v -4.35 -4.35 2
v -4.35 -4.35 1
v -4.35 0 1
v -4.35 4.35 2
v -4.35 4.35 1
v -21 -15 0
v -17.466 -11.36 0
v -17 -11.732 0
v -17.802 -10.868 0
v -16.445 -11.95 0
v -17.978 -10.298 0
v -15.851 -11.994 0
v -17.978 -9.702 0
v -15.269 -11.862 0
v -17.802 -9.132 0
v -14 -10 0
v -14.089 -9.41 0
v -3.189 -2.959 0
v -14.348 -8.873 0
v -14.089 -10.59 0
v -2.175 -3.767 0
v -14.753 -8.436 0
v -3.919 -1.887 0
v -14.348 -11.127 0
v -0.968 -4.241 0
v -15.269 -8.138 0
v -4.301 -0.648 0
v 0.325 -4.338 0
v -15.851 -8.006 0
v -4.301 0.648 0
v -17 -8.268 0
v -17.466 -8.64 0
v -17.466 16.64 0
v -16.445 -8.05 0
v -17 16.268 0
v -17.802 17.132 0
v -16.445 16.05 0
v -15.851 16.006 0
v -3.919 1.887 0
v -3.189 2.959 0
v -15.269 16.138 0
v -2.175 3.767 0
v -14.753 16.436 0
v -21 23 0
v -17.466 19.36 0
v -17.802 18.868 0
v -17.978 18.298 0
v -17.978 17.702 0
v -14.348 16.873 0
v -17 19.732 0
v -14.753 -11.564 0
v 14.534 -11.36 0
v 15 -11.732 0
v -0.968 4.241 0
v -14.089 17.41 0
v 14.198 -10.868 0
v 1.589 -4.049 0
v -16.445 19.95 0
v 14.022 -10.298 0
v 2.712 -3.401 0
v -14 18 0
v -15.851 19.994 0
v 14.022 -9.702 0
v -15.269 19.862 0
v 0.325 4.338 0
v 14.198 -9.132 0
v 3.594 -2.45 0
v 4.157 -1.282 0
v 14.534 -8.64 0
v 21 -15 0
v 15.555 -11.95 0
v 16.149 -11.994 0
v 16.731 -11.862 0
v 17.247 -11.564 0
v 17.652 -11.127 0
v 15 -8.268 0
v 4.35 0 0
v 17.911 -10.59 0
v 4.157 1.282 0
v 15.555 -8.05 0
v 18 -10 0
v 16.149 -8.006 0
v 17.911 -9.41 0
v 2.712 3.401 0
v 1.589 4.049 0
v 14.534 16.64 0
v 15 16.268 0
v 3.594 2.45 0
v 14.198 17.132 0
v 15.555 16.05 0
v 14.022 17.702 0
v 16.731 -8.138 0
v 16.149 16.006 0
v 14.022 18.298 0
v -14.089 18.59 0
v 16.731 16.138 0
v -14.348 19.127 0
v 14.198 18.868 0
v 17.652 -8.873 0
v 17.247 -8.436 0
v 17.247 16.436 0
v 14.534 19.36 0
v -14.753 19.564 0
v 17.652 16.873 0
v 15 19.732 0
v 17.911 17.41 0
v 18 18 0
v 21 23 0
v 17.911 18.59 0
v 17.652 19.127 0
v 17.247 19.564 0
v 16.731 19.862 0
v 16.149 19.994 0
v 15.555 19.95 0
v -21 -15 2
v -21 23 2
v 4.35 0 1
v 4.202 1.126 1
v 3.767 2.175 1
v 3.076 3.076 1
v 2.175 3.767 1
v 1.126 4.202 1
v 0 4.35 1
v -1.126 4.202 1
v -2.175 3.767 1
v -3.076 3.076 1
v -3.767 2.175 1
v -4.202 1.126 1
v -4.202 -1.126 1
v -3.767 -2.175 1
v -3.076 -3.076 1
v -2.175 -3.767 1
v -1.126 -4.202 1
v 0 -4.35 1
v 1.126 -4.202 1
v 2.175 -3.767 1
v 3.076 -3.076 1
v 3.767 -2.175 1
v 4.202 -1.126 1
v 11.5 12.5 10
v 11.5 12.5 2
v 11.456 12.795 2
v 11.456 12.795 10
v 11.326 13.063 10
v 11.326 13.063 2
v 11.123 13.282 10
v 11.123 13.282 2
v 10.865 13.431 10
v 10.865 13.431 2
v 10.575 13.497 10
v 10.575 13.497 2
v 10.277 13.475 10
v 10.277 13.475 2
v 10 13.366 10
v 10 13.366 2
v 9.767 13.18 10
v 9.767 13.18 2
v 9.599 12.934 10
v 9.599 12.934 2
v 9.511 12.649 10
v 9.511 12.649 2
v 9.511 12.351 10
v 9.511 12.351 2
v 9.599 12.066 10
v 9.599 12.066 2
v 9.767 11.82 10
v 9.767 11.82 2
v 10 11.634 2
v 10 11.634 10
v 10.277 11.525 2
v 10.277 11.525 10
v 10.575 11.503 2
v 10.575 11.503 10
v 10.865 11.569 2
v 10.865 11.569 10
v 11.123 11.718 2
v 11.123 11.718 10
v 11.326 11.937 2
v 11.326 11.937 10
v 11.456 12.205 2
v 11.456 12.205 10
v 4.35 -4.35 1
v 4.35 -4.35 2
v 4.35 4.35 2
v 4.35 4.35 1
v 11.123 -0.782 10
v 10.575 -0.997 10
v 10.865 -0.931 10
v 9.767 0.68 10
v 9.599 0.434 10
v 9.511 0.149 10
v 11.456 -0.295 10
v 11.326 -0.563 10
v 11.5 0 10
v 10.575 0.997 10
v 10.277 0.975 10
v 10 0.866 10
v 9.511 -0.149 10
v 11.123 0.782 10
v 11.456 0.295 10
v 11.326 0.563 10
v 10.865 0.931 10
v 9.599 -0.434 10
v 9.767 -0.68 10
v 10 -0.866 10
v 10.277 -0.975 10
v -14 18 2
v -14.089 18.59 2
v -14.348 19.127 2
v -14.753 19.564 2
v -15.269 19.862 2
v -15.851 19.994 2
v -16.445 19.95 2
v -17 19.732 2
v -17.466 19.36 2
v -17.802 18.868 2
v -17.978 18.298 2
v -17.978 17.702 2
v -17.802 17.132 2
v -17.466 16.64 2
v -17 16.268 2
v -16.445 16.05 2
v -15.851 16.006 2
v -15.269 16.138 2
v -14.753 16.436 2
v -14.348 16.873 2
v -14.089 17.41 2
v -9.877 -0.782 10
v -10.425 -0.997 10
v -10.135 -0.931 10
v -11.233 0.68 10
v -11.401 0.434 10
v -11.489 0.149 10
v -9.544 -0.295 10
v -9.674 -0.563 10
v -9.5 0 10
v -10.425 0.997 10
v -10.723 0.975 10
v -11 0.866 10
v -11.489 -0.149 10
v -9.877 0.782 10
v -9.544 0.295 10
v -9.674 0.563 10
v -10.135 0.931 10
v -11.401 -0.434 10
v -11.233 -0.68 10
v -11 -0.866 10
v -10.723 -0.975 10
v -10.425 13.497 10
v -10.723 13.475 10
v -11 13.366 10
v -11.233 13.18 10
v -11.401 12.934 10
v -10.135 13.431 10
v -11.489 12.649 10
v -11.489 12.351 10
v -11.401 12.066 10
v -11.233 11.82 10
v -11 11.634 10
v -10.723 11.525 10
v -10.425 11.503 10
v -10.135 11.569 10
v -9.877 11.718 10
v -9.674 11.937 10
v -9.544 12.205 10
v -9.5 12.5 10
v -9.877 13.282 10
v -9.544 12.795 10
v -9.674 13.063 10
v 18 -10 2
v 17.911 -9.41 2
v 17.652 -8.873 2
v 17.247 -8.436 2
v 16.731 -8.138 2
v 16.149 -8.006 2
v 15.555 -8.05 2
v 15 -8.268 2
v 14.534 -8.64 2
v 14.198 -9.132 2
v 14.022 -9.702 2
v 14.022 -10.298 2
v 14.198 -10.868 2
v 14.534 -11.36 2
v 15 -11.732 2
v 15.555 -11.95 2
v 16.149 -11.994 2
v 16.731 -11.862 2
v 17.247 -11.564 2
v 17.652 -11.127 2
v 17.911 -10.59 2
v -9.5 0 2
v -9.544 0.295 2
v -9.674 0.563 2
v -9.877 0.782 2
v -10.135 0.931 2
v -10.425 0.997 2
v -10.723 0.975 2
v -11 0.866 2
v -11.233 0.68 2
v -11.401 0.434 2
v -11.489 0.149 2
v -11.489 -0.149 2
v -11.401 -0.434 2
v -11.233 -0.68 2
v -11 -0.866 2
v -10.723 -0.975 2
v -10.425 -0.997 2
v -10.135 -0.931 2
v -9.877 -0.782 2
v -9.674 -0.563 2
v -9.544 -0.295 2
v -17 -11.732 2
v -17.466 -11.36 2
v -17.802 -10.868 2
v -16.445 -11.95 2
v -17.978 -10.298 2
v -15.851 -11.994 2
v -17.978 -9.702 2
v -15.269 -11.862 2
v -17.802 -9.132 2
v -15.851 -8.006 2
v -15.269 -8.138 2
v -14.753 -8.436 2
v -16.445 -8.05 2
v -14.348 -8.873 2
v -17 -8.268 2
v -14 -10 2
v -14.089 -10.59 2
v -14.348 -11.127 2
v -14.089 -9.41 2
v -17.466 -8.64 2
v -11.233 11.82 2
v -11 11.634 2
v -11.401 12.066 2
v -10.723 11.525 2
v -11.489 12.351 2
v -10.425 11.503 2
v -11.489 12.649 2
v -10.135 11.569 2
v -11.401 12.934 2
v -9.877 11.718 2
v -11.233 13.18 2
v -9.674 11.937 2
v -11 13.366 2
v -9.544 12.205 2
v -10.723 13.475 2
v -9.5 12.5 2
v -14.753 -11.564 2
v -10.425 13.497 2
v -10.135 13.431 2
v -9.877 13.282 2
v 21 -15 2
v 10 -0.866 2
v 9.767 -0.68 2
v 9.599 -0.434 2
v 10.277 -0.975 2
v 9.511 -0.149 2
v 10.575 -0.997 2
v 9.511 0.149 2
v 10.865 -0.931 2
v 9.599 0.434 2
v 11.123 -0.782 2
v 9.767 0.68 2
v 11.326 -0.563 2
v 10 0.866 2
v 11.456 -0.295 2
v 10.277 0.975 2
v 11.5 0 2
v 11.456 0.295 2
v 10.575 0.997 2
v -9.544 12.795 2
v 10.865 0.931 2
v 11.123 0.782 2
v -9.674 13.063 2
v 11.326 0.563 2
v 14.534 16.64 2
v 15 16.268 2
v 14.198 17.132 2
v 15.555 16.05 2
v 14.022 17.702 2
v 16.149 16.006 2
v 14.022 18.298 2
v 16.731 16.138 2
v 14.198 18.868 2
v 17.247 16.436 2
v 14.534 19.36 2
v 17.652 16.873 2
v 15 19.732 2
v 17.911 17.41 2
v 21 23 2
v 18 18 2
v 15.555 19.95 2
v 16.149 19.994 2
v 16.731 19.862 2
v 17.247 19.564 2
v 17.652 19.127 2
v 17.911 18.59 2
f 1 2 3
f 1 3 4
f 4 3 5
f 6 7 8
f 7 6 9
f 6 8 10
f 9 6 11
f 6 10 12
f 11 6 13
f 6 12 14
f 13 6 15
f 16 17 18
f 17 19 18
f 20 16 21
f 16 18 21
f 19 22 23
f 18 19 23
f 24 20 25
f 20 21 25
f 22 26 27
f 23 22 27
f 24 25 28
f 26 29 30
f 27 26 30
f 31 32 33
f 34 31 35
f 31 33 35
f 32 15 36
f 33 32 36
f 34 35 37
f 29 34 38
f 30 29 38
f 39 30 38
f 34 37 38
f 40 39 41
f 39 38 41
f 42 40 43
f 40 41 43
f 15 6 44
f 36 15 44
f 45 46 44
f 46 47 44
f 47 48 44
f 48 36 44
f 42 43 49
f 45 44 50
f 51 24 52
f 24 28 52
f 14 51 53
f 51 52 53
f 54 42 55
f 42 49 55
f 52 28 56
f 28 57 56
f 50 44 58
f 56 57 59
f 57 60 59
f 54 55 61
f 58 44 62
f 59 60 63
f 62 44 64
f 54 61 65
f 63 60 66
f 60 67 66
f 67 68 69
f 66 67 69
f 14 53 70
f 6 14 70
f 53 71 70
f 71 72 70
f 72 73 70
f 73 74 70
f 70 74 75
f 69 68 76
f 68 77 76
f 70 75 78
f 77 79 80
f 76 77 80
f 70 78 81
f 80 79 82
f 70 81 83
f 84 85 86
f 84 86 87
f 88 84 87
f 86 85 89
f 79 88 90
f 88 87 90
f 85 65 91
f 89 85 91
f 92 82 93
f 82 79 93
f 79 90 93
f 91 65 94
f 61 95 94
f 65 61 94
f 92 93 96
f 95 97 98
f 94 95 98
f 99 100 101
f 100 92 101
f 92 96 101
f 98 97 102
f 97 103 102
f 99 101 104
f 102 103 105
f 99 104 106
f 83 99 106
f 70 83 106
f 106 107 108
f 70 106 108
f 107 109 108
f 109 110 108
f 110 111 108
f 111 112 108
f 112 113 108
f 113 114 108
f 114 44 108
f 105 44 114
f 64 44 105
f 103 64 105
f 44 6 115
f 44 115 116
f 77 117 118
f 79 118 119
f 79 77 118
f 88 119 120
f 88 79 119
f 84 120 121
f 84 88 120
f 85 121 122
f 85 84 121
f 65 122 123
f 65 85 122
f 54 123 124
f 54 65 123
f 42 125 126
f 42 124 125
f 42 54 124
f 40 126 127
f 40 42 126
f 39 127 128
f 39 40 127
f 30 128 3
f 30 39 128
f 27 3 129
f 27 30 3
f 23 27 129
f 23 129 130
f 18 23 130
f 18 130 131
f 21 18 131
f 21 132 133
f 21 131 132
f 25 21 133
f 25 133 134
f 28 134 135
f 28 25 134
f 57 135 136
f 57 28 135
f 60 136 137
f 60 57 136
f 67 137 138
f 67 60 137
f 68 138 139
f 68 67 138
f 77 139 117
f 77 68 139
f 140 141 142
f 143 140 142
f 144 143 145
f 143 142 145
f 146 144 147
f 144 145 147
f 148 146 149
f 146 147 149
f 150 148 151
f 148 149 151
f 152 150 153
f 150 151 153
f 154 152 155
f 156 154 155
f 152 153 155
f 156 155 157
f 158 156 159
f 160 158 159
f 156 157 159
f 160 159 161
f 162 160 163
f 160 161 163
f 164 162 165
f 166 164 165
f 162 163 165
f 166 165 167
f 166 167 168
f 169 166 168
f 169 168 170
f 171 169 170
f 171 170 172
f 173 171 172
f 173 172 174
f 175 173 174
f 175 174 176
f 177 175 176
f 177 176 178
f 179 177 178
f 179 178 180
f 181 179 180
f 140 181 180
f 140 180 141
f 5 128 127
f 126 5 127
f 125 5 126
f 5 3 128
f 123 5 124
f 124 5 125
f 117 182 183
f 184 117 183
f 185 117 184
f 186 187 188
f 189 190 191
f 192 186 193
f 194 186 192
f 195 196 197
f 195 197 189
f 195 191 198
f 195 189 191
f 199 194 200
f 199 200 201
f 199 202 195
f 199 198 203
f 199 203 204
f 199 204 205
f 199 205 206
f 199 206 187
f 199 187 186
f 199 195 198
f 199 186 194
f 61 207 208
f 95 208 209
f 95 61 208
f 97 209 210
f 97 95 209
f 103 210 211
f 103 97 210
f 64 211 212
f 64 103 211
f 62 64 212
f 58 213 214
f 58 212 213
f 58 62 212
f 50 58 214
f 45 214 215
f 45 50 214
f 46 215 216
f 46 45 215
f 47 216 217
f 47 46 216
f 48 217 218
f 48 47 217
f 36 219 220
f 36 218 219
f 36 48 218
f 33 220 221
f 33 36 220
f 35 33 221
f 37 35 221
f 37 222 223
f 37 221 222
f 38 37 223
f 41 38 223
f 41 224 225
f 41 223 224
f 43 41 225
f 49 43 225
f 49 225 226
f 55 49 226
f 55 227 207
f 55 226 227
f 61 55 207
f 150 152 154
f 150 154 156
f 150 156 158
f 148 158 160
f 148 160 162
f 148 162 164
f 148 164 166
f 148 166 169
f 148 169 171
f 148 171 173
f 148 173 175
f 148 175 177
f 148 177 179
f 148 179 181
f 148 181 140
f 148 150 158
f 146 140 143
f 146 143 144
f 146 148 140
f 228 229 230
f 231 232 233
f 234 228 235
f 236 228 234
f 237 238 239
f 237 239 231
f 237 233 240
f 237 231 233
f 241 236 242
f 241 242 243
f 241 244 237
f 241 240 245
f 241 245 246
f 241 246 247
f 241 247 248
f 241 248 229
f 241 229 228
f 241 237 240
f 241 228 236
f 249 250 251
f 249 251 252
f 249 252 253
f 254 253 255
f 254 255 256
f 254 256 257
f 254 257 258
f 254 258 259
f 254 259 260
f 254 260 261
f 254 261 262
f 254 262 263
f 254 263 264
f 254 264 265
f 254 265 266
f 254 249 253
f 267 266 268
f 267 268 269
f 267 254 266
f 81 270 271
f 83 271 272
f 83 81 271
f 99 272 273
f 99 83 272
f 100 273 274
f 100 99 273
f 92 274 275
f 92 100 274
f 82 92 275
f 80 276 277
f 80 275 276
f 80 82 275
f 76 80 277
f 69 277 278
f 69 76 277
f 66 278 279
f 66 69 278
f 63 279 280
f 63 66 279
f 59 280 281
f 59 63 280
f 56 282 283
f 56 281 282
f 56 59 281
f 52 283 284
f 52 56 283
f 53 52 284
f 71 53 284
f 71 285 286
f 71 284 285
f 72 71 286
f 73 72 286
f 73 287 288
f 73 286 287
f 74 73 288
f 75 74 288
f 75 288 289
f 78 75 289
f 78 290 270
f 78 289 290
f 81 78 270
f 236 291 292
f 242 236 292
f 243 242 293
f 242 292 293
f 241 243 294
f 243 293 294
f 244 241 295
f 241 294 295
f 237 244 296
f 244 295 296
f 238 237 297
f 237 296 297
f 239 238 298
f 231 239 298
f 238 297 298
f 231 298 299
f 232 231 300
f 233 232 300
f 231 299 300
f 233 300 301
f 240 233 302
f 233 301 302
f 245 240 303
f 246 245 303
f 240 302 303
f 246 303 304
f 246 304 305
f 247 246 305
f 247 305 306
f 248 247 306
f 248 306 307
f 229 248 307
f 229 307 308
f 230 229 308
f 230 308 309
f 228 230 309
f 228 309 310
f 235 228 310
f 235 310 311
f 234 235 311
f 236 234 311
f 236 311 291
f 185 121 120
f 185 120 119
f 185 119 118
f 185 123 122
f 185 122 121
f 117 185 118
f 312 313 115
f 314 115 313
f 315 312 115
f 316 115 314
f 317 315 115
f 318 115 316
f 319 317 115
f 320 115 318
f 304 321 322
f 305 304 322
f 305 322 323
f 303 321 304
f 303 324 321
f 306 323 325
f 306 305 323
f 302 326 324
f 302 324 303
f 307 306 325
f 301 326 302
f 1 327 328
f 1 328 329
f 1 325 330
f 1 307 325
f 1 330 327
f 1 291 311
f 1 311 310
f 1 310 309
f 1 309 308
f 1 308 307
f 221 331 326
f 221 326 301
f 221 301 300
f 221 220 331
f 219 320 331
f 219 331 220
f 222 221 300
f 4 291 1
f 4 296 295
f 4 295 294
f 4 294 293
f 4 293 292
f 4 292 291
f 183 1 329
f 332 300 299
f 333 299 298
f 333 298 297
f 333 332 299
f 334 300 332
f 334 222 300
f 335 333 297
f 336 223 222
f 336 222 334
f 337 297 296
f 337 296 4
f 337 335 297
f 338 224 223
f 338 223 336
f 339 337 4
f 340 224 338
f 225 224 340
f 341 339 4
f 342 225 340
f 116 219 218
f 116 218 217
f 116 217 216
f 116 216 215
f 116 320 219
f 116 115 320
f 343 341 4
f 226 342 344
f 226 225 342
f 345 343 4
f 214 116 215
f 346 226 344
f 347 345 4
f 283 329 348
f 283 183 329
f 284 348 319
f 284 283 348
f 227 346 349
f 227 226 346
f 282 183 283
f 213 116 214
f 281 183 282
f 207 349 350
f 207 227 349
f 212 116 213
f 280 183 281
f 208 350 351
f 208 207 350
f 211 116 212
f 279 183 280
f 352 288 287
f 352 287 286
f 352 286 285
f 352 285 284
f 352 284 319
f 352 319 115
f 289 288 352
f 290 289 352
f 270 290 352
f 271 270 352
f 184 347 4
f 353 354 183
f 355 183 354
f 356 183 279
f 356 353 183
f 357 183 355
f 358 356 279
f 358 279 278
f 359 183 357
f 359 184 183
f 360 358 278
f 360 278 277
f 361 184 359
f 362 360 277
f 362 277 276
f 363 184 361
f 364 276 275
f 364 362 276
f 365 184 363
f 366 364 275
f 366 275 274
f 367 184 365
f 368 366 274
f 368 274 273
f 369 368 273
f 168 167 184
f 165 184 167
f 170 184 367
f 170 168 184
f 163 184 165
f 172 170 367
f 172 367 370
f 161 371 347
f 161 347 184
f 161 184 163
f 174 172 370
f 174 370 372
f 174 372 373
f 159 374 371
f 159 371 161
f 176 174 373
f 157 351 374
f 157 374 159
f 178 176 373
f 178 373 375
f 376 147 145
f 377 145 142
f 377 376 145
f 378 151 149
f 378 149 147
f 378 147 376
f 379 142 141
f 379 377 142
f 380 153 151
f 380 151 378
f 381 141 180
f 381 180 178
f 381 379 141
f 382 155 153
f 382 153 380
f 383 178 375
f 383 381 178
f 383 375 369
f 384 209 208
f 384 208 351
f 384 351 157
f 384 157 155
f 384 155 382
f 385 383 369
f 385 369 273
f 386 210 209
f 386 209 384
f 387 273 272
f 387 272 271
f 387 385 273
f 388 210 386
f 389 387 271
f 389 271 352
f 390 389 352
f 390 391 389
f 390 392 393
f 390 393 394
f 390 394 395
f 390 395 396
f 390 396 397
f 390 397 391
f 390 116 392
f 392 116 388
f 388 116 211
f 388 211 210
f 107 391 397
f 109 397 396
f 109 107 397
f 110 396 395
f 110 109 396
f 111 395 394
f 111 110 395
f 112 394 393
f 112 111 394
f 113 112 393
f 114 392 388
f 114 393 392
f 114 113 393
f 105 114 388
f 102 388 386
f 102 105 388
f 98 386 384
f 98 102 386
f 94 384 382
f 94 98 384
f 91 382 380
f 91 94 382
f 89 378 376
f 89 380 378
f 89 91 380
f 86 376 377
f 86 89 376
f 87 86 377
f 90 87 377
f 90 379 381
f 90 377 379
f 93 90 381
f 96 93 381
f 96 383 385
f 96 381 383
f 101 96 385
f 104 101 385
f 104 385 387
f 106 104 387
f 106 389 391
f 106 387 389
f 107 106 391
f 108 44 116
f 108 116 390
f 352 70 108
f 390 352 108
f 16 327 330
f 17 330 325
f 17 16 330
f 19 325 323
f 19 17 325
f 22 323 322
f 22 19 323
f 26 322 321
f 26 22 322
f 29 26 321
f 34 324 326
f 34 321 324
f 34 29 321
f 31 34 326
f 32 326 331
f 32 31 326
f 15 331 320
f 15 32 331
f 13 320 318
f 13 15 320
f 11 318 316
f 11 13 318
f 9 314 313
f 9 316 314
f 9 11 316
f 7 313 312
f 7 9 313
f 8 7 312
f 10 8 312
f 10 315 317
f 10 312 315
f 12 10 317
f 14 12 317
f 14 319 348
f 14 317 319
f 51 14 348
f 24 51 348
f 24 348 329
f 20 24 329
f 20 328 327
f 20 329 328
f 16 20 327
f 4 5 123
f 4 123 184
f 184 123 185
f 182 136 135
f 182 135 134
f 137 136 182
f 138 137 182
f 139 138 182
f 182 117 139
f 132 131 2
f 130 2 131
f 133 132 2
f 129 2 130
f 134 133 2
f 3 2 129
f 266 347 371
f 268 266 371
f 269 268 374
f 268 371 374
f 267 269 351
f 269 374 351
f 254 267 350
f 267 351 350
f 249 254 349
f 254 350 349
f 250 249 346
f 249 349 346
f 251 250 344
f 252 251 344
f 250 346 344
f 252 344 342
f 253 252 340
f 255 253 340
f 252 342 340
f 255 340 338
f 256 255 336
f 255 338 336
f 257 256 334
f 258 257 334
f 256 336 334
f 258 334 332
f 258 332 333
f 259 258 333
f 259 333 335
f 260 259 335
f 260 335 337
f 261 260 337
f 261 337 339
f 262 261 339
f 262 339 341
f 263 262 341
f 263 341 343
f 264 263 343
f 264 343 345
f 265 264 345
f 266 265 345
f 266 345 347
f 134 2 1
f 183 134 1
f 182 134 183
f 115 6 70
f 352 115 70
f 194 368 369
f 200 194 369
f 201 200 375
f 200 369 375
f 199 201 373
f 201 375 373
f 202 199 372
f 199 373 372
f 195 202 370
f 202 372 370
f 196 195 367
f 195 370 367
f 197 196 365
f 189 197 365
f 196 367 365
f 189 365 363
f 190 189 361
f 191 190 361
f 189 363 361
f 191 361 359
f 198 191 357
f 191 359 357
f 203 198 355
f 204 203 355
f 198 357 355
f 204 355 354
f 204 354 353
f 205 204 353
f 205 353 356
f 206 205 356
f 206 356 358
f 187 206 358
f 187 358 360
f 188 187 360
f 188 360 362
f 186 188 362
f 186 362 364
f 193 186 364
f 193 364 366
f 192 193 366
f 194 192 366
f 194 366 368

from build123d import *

# Parameters (mm, degrees)
CYLINDER002_R     = 1
CYLINDER002_DEPTH = 10
CYLINDER003_R     = 1
CYLINDER003_DEPTH = 10
CYLINDER004_R     = 1
CYLINDER004_DEPTH = 10
CYLINDER005_R     = 2
CYLINDER005_DEPTH = 10
CYLINDER006_R     = 2
CYLINDER006_DEPTH = 10
CYLINDER007_R     = 2
CYLINDER007_DEPTH = 10
CYLINDER008_R     = 2
CYLINDER008_DEPTH = 10
CYLINDER_R        = 4.35
CYLINDER_DEPTH    = 10
BOX_W             = 8.7
BOX_H             = 8.7
BOX_DEPTH         = 2
BOX001_W          = 42
BOX001_H          = 38
BOX001_DEPTH      = 2
CYLINDER001_R     = 1
CYLINDER001_DEPTH = 10


with BuildPart() as screw_support001:
    # Cylinder002 → Cylinder002 (new body)
    with BuildSketch(Plane(origin=(10.5, 0, 0), x_dir=(1, 0, 0), z_dir=(0, 0, 1))):
        Circle(CYLINDER002_R)
    extrude(amount=CYLINDER002_DEPTH)


with BuildPart() as screw_support002:
    # Cylinder003 → Cylinder003 (new body)
    with BuildSketch(Plane(origin=(-10.5, 12.5, 0), x_dir=(1, 0, 0), z_dir=(0, 0, 1))):
        Circle(CYLINDER003_R)
    extrude(amount=CYLINDER003_DEPTH)


with BuildPart() as screw_support003:
    # Cylinder004 → Cylinder004 (new body)
    with BuildSketch(Plane(origin=(10.5, 12.5, 0), x_dir=(1, 0, 0), z_dir=(0, 0, 1))):
        Circle(CYLINDER004_R)
    extrude(amount=CYLINDER004_DEPTH)


with BuildPart() as bolthole:
    # Cylinder005 → Cylinder005 (new body)
    with BuildSketch(Plane(origin=(-16, -10, 0), x_dir=(1, 0, 0), z_dir=(0, 0, 1))):
        Circle(CYLINDER005_R)
    extrude(amount=CYLINDER005_DEPTH)


with BuildPart() as bolthole001:
    # Cylinder006 → Cylinder006 (new body)
    with BuildSketch(Plane(origin=(16, 18, 0), x_dir=(1, 0, 0), z_dir=(0, 0, 1))):
        Circle(CYLINDER006_R)
    extrude(amount=CYLINDER006_DEPTH)


with BuildPart() as bolthole002:
    # Cylinder007 → Cylinder007 (new body)
    with BuildSketch(Plane(origin=(16, -10, 0), x_dir=(1, 0, 0), z_dir=(0, 0, 1))):
        Circle(CYLINDER007_R)
    extrude(amount=CYLINDER007_DEPTH)


with BuildPart() as bolthole003:
    # Cylinder008 → Cylinder008 (new body)
    with BuildSketch(Plane(origin=(-16, 18, 0), x_dir=(1, 0, 0), z_dir=(0, 0, 1))):
        Circle(CYLINDER008_R)
    extrude(amount=CYLINDER008_DEPTH)


with BuildPart() as cylinder:
    # Cylinder → Cylinder (new body)
    with BuildSketch(Plane.XY.offset(-3)):
        Circle(CYLINDER_R)
    extrude(amount=CYLINDER_DEPTH)


with BuildPart() as cube:
    # Box → Box (new body)
    with BuildSketch(Plane(origin=(-4.35, -4.35, 1), x_dir=(1, 0, 0), z_dir=(0, 0, 1))):
        with Locations((4.35, 4.35)):
            Rectangle(BOX_W, BOX_H)
    extrude(amount=BOX_DEPTH)


with BuildPart() as cut005:
    # Box001 → Box001 (new body)
    with BuildSketch(Plane(origin=(-21, -15, 0), x_dir=(1, 0, 0), z_dir=(0, 0, 1))):
        with Locations((21, 19)):
            Rectangle(BOX001_W, BOX001_H)
    extrude(amount=BOX001_DEPTH)

    # Cut: cut Cube
    add(cube.part, mode=Mode.SUBTRACT)

    # Cut001: cut Cylinder
    add(cylinder.part, mode=Mode.SUBTRACT)

    # Cut002: cut BoltHole003
    add(bolthole003.part, mode=Mode.SUBTRACT)

    # Cut003: cut BoltHole002
    add(bolthole002.part, mode=Mode.SUBTRACT)

    # Cut004: cut BoltHole001
    add(bolthole001.part, mode=Mode.SUBTRACT)

    # Cut005: cut BoltHole
    add(bolthole.part, mode=Mode.SUBTRACT)


with BuildPart() as fusion_camfront:
    # Cylinder001 → Cylinder001 (new body)
    with BuildSketch(Plane(origin=(-10.5, 0, 0), x_dir=(1, 0, 0), z_dir=(0, 0, 1))):
        Circle(CYLINDER001_R)
    extrude(amount=CYLINDER001_DEPTH)

    # Fusion: union screw support001, screw support002, screw support003, Cut005
    add(screw_support001.part)
    add(screw_support002.part)
    add(screw_support003.part)
    add(cut005.part)


solid = fusion_camfront.part
